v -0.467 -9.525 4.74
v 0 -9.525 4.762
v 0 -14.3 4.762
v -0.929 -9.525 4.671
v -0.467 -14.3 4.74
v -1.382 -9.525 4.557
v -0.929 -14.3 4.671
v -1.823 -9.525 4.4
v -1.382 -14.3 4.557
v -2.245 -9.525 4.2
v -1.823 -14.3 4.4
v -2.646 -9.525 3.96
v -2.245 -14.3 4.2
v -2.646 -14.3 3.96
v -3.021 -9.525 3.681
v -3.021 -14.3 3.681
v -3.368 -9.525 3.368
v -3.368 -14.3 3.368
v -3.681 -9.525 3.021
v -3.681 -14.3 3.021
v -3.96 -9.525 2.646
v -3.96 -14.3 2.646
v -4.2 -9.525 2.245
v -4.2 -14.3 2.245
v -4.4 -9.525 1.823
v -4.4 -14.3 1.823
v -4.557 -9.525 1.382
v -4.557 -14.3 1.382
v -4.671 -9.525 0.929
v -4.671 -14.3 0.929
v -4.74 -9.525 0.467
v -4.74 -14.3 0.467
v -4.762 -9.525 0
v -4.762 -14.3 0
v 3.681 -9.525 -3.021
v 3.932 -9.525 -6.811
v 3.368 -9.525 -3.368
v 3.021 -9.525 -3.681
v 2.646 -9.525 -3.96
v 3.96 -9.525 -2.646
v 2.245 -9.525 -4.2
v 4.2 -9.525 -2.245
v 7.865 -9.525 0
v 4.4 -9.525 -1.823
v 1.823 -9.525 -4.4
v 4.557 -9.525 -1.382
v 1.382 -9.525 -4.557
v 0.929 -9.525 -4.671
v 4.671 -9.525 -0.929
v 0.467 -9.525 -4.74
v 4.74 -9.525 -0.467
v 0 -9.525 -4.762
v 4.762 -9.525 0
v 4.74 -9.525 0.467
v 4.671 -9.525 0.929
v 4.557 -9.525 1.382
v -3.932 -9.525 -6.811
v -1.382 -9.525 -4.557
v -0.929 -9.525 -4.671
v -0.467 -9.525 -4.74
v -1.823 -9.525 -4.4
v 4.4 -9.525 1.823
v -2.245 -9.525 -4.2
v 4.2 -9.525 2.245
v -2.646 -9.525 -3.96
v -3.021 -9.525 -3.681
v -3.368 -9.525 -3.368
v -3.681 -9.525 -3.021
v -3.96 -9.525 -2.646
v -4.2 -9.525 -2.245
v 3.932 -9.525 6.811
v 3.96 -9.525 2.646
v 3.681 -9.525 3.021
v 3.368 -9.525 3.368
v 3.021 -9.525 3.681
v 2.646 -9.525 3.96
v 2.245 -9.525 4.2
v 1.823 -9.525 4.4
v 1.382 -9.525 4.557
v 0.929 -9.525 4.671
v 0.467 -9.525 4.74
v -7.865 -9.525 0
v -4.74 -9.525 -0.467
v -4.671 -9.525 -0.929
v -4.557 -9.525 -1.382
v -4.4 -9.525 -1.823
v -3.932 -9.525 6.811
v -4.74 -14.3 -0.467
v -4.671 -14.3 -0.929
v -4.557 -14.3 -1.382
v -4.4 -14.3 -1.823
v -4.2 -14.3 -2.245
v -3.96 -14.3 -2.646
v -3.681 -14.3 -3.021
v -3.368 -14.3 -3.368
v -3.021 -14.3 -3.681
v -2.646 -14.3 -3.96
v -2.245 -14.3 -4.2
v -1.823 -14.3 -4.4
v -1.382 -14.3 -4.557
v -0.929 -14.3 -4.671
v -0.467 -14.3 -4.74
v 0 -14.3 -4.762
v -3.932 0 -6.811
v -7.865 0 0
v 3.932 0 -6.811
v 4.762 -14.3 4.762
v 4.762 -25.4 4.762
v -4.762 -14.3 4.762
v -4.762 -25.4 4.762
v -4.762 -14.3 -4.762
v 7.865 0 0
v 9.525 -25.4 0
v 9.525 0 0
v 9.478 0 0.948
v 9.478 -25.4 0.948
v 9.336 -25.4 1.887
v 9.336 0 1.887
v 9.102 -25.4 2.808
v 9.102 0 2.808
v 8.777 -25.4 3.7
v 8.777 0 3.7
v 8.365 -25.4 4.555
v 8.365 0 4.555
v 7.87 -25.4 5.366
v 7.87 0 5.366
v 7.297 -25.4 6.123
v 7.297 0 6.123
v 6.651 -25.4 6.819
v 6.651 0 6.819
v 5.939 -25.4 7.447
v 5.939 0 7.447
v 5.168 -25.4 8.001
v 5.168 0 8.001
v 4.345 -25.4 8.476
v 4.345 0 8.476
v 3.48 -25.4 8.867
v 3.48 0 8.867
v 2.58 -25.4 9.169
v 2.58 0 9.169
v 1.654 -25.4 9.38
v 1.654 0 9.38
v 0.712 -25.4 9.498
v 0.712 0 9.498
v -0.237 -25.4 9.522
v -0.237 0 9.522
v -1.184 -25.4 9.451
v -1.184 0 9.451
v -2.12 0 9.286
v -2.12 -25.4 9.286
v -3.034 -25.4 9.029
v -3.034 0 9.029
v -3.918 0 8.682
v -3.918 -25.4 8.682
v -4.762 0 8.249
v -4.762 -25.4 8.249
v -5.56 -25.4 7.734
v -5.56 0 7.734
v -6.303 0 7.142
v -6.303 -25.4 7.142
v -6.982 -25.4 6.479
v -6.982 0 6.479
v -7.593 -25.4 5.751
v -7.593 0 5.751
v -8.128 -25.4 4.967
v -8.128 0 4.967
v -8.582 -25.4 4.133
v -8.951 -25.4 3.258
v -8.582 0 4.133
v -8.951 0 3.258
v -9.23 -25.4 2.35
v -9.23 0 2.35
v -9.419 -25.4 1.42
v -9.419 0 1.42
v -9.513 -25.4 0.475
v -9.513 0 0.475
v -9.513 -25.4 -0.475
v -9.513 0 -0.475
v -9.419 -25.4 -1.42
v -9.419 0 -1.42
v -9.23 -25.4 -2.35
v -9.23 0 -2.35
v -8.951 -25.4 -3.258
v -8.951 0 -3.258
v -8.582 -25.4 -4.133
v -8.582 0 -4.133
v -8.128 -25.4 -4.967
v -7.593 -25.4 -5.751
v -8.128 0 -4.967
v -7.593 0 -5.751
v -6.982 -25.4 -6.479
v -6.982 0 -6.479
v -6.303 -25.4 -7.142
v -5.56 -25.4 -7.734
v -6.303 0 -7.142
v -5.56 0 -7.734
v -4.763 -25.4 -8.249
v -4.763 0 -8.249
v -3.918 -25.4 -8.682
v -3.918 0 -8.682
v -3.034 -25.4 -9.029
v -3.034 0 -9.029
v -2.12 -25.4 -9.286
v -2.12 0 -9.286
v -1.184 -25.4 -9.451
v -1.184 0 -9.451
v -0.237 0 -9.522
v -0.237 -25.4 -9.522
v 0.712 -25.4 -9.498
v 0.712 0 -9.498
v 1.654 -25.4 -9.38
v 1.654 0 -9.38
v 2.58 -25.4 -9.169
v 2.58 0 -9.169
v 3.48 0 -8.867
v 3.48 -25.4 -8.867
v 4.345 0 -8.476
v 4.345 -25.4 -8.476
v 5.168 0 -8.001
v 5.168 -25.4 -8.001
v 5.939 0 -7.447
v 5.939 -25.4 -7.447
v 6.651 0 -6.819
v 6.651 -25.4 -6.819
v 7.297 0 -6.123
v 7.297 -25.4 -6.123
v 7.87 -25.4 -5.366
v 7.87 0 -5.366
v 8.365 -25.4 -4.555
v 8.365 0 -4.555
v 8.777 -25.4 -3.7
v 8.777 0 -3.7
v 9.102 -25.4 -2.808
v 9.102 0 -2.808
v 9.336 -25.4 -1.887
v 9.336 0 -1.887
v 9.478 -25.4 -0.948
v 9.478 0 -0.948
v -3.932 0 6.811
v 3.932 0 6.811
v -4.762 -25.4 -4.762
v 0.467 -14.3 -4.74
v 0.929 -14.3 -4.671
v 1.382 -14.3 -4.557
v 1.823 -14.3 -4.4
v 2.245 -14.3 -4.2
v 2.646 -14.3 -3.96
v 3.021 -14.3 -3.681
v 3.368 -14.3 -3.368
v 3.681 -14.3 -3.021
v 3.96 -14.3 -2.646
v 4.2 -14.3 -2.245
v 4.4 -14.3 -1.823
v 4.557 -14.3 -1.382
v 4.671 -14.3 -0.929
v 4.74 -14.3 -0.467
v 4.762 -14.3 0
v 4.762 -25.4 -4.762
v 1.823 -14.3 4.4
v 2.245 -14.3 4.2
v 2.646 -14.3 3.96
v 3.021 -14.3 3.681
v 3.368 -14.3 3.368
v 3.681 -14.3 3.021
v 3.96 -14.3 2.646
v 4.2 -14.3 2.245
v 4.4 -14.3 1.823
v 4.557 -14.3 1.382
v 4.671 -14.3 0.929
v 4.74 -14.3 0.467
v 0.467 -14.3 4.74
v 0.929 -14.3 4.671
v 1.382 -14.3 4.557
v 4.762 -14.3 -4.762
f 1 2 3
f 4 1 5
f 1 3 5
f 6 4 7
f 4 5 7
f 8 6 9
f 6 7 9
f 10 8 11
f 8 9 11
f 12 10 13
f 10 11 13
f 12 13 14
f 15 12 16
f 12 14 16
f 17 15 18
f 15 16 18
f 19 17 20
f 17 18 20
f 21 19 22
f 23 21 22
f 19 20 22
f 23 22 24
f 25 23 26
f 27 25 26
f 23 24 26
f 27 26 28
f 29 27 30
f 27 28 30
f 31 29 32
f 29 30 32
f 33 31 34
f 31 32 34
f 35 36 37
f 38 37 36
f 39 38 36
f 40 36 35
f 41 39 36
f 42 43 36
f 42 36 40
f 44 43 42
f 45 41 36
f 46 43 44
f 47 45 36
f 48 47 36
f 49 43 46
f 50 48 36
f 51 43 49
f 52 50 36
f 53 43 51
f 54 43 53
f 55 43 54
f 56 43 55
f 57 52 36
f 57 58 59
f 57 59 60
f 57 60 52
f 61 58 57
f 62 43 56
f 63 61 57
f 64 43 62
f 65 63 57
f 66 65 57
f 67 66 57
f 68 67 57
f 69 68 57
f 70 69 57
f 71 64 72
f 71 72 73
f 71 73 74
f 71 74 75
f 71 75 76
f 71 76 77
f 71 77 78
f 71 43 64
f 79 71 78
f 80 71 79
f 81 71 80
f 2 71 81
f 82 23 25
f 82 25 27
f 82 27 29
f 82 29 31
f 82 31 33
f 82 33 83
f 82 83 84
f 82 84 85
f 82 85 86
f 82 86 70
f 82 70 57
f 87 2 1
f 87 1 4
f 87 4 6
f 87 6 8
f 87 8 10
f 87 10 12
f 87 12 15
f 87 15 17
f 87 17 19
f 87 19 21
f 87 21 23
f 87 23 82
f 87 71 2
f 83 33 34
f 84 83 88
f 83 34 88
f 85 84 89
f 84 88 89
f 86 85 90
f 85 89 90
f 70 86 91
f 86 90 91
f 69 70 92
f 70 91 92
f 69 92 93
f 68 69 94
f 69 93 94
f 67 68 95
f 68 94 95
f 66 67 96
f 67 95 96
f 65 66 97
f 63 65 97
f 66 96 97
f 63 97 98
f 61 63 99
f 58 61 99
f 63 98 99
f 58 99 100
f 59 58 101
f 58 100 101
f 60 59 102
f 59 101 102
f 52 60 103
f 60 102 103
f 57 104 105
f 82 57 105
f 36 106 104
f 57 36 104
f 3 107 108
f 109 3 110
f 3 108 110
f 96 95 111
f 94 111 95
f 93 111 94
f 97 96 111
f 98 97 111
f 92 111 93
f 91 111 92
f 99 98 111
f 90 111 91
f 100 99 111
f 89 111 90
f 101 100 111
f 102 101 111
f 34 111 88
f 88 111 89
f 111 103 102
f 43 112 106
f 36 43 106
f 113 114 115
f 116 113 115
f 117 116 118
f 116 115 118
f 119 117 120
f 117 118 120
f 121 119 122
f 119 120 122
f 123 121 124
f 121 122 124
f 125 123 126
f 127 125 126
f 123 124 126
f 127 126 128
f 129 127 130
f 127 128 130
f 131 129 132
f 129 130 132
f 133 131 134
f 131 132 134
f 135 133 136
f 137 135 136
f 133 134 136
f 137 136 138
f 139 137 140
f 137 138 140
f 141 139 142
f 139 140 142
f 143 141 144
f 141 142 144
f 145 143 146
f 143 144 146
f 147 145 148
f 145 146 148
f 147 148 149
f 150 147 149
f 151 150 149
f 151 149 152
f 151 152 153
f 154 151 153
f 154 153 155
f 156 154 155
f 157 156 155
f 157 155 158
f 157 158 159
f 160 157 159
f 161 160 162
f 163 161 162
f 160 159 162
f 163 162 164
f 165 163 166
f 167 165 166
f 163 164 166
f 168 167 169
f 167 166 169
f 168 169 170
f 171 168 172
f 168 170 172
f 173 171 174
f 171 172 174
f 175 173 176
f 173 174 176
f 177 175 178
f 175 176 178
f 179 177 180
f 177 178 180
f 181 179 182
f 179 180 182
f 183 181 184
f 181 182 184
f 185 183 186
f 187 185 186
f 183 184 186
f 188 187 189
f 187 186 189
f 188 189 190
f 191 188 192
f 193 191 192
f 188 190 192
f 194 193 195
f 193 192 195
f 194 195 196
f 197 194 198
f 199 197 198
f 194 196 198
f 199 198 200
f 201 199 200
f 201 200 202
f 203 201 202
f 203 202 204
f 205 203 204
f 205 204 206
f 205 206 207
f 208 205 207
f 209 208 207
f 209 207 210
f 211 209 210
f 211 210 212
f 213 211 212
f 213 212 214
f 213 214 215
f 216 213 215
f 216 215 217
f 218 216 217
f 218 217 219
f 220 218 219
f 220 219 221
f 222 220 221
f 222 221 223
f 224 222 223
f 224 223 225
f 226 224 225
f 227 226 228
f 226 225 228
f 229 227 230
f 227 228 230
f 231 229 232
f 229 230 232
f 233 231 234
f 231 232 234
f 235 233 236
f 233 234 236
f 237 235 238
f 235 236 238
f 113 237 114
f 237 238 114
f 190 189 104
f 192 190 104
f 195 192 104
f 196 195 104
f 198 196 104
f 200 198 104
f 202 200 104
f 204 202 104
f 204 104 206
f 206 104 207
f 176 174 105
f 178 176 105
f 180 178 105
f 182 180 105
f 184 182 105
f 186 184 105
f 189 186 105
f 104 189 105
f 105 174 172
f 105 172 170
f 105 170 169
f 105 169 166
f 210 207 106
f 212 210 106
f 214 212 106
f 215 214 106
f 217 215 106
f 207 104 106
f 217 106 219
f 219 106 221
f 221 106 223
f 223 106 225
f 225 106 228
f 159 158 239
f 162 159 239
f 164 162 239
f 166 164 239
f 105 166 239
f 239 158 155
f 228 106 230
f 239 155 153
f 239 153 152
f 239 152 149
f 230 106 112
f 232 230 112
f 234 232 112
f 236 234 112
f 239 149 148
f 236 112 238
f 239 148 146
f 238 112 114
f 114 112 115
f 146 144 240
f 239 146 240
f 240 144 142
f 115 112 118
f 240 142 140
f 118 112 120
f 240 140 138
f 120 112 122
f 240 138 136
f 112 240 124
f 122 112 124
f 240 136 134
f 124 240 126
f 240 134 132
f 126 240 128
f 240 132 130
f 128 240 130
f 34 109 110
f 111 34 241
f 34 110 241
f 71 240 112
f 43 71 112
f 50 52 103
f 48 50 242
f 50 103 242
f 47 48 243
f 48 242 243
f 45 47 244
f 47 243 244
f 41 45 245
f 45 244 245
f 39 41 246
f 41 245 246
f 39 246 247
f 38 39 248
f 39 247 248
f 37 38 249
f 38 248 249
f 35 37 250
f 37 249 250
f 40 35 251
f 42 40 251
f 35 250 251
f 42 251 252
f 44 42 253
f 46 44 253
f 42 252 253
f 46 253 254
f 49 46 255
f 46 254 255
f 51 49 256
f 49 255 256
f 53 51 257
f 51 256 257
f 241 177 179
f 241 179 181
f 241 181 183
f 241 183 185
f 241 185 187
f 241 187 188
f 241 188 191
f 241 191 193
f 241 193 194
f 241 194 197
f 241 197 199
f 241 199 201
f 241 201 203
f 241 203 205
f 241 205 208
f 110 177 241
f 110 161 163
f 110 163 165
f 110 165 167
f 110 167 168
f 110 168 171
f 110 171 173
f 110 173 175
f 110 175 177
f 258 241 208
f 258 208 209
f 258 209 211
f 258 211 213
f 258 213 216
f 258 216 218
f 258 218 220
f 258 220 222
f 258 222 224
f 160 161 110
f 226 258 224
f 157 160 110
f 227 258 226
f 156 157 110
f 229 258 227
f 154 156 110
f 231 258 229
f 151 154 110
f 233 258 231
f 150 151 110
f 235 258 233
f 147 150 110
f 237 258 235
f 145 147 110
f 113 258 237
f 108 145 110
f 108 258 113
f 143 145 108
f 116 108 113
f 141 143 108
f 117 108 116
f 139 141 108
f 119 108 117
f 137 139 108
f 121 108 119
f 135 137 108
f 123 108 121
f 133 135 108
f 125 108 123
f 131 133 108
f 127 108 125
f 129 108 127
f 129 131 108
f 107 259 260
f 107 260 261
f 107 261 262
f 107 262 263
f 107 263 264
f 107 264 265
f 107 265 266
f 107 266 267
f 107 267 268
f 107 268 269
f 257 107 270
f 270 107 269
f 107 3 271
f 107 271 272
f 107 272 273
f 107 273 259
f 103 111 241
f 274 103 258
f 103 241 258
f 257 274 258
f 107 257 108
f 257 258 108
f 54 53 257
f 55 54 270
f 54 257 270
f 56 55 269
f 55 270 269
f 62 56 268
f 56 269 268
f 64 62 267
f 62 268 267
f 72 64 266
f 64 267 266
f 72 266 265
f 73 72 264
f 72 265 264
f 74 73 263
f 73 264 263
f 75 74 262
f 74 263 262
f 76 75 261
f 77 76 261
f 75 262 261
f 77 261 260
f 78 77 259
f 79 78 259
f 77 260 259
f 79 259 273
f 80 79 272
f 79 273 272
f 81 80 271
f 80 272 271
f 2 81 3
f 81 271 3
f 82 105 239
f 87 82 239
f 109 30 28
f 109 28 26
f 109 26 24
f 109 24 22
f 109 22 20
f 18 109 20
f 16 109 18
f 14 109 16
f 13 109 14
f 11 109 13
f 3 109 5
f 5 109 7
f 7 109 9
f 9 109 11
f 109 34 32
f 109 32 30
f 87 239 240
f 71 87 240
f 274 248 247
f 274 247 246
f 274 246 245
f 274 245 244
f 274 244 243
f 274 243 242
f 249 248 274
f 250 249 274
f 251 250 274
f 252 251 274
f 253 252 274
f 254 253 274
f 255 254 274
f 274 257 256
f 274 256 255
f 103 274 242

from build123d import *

# Parameters (mm, degrees)
F0_R     = 9.525
F1_DEPTH = 25.4
F3_DEPTH = 25.401
F4_DEPTH = 11.0998
F6_DEPTH = 9.525


with BuildPart() as f1:
    # F0 (on Front) → F1 (new body)
    with BuildSketch(Plane.XZ):
        Circle(F0_R)
    extrude(amount=F1_DEPTH)

    # F2 (on face) → F3 (cut, through all)
    with BuildSketch(Plane.XZ.offset(25.4)):
        with BuildLine():
            ThreePointArc((4.7625, 0), (3.367596, 3.367596), (0, 4.7625))
            ThreePointArc((0, 4.7625), (-3.367596, 3.367596), (-4.7625, 0))
            ThreePointArc((-4.7625, 0), (-3.367596, -3.367596), (0, -4.7625))
            ThreePointArc((0, -4.7625), (3.367596, -3.367596), (4.7625, 0))
        make_face()
    extrude(amount=-F3_DEPTH, mode=Mode.SUBTRACT)

    # F2 (on face) → F4 (cut)
    with BuildSketch(Plane.XZ.offset(25.4)):
        with BuildLine():
            Line((4.7625, 0), (4.7625, 4.7625))
            Line((4.7625, 4.7625), (0, 4.7625))
            ThreePointArc((0, 4.7625), (3.367596, 3.367596), (4.7625, 0))
        make_face()
        with BuildLine():
            ThreePointArc((-4.7625, 0), (-3.367596, 3.367596), (0, 4.7625))
            Line((0, 4.7625), (-4.7625, 4.7625))
            Line((-4.7625, 4.7625), (-4.7625, 0))
        make_face()
        with BuildLine():
            Line((4.7625, -4.7625), (4.7625, 0))
            ThreePointArc((4.7625, 0), (3.367596, -3.367596), (0, -4.7625))
            Line((0, -4.7625), (4.7625, -4.7625))
        make_face()
        with BuildLine():
            ThreePointArc((0, -4.7625), (-3.367596, -3.367596), (-4.7625, 0))
            Line((-4.7625, 0), (-4.7625, -4.7625))
            Line((-4.7625, -4.7625), (0, -4.7625))
        make_face()
    extrude(amount=-F4_DEPTH, mode=Mode.SUBTRACT)

    # F5 (on face) → F6 (cut)
    with BuildSketch(Plane(origin=(0, 0, 0), x_dir=(-1, 0, 0), z_dir=(0, 1, 0))):
        Polygon((3.932339, 6.811012), (-3.932339, 6.811012), (-7.864679, 0), (-3.932339, -6.811012), (3.932339, -6.811012), (7.864679, 0), align=None)
    extrude(amount=-F6_DEPTH, mode=Mode.SUBTRACT)


solid = f1.part
